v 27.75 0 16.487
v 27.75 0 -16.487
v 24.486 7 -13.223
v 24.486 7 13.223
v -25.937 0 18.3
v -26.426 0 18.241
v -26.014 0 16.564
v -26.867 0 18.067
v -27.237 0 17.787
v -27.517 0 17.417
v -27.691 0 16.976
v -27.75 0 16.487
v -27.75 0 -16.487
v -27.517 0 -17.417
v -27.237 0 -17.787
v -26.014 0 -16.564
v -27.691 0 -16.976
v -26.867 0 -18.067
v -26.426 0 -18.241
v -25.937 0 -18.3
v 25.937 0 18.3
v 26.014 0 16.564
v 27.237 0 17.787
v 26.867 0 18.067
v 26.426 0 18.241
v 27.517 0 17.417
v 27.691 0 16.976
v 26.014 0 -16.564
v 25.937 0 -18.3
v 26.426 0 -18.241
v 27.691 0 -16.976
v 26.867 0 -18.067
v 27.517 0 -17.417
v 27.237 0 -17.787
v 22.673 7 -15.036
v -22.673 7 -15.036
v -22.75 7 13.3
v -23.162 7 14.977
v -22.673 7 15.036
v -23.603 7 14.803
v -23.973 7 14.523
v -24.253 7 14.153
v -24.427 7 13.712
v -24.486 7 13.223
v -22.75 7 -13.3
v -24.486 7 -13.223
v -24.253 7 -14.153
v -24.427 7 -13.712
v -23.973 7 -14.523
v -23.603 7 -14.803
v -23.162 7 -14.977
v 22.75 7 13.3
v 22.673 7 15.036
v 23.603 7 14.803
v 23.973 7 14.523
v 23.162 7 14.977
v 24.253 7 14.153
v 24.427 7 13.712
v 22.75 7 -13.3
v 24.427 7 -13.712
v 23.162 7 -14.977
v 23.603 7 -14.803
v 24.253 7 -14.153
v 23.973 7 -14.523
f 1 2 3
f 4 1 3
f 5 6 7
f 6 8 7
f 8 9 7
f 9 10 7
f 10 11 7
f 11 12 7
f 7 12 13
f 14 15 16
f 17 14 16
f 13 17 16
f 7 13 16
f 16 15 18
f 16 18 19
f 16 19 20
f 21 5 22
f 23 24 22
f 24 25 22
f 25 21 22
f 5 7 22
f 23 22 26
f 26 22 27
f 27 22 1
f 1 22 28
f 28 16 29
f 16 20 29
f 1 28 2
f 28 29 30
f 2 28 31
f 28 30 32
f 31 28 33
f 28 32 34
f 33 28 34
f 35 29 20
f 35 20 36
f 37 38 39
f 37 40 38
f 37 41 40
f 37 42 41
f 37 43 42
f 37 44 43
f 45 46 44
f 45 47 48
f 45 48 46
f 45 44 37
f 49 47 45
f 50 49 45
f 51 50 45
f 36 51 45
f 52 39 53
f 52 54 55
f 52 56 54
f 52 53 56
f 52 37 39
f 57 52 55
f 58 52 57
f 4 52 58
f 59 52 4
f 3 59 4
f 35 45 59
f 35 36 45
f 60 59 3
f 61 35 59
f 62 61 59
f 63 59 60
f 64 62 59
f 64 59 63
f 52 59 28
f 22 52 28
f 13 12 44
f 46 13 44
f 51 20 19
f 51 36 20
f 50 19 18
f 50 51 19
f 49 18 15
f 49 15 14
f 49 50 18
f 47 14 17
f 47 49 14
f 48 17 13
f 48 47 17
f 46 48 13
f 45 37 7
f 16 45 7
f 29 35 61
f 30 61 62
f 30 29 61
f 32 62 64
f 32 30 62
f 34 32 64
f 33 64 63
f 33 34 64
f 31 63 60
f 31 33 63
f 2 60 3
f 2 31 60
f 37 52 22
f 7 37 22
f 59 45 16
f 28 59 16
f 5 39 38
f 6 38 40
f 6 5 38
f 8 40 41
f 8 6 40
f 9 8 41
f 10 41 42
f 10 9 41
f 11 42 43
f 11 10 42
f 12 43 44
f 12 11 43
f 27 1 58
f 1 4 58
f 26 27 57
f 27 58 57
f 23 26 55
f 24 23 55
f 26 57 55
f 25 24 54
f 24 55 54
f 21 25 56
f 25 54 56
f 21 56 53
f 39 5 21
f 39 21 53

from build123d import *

# Parameters (mm, degrees)
ESQUISSE2_W        = 55.5
ESQUISSE2_H        = 36.6
ESQUISSE2_W_2      = 45.5
ESQUISSE2_H_2      = 26.6
BOSS_EXTRU_1_DEPTH = 7
CONG_3_R           = 2


with BuildPart() as part:
    # Esquisse2 → Boss.-Extru.1 (new body)
    with BuildSketch(Plane(origin=(0, 0, 0), x_dir=(1, 0, 0), z_dir=(0, 1, 0))):
        Rectangle(ESQUISSE2_W, ESQUISSE2_H)
        Rectangle(ESQUISSE2_W_2, ESQUISSE2_H_2, mode=Mode.SUBTRACT)
    extrude(amount=BOSS_EXTRU_1_DEPTH)

    # Chanfrein1
    # the kernel refuses this chamfer: 7, 3.264153607 mm, written as the material it takes off along each edge
    with BuildSketch(Plane(origin=(27.75, 7, 18.3), x_dir=(0, -0.9998669641130704, 0.01631116413111024), z_dir=(-1, 0, 0)), Plane(origin=(-27.75, 7, -18.3), x_dir=(0, -0.9998669641130704, -0.01631116413111024), z_dir=(1, 0, 0))) as chanfrein1_piece_1:
        with BuildLine():
            Line((7.25473132, 0), (-0.308904716, -3.377897506))
            Line((-0.308904716, -3.377897506), (-0.448886091, -3.375613943))
            ThreePointArc((-0.448886091, -3.375613943), (-0.167567523, -1.688734801), (-0.139981375, 0.002283563))
            Line((-0.139981375, 0.002283563), (0.002283563, 0.139981375))
            ThreePointArc((0.002283563, 0.139981375), (3.628684148, 0.08082269), (7.257014883, 0.139981375))
            Line((7.257014883, 0.139981375), (7.25473132, 0))
        make_face()
    extrude(amount=55.5, mode=Mode.SUBTRACT)
    with BuildSketch(Plane(origin=(27.75, 7, -18.3), x_dir=(0.01631116413111024, -0.9998669641130704, 0), z_dir=(0, 0, 1)), Plane(origin=(-27.75, 7, 18.3), x_dir=(-0.01631116413111024, -0.9998669641130704, 0), z_dir=(0, 0, -1))) as chanfrein1_piece_2:
        with BuildLine():
            Line((7.25473132, 0), (-0.308904716, -3.377897506))
            Line((-0.308904716, -3.377897506), (-0.448886091, -3.375613943))
            ThreePointArc((-0.448886091, -3.375613943), (-0.167567523, -1.688734801), (-0.139981375, 0.002283563))
            Line((-0.139981375, 0.002283563), (0.002283563, 0.139981375))
            ThreePointArc((0.002283563, 0.139981375), (3.628684148, 0.08082269), (7.257014883, 0.139981375))
            Line((7.257014883, 0.139981375), (7.25473132, 0))
        make_face()
    extrude(amount=36.6, mode=Mode.SUBTRACT)
    with BuildSketch(Plane(origin=(22.75, 0, 13.3), x_dir=(0, 0.9998669641130704, -0.016311164131110483), z_dir=(-1, 0, 0)), Plane(origin=(-22.75, 0, -13.3), x_dir=(0, 0.9998669641130704, 0.016311164131110483), z_dir=(1, 0, 0))) as chanfrein1_piece_3:
        with BuildLine():
            Line((7.25473132, 0), (-0.308904716, -3.377897506))
            Line((-0.308904716, -3.377897506), (-0.448886091, -3.375613943))
            ThreePointArc((-0.448886091, -3.375613943), (-0.167567523, -1.688734801), (-0.139981375, 0.002283563))
            Line((-0.139981375, 0.002283563), (0.002283563, 0.139981375))
            ThreePointArc((0.002283563, 0.139981375), (3.628684148, 0.08082269), (7.257014883, 0.139981375))
            Line((7.257014883, 0.139981375), (7.25473132, 0))
        make_face()
    extrude(amount=45.5, mode=Mode.SUBTRACT)
    with BuildSketch(Plane(origin=(-22.75, 0, 13.3), x_dir=(0.01631116413111024, 0.9998669641130704, 0), z_dir=(0, 0, -1)), Plane(origin=(22.75, 0, -13.3), x_dir=(-0.01631116413111024, 0.9998669641130704, 0), z_dir=(0, 0, 1))) as chanfrein1_piece_4:
        with BuildLine():
            Line((7.25473132, 0), (-0.308904716, -3.377897506))
            Line((-0.308904716, -3.377897506), (-0.448886091, -3.375613943))
            ThreePointArc((-0.448886091, -3.375613943), (-0.167567523, -1.688734801), (-0.139981375, 0.002283563))
            Line((-0.139981375, 0.002283563), (0.002283563, 0.139981375))
            ThreePointArc((0.002283563, 0.139981375), (3.628684148, 0.08082269), (7.257014883, 0.139981375))
            Line((7.257014883, 0.139981375), (7.25473132, 0))
        make_face()
    extrude(amount=26.6, mode=Mode.SUBTRACT)
    with BuildSketch(Plane(origin=(27.75, 7, -18.3), x_dir=(0.01631116413111024, -0.9998669641130704, 0), z_dir=(0, 0, 1))) as chanfrein1_piece_5a_section:
        with BuildLine():
            Line((7.25473132, 0), (-0.308904716, -3.377897506))
            Line((-0.308904716, -3.377897506), (-0.448886091, -3.375613943))
            ThreePointArc((-0.448886091, -3.375613943), (-0.167567523, -1.688734801), (-0.139981375, 0.002283563))
            Line((-0.139981375, 0.002283563), (0.002283563, 0.139981375))
            ThreePointArc((0.002283563, 0.139981375), (3.628684148, 0.08082269), (7.257014883, 0.139981375))
            Line((7.257014883, 0.139981375), (7.25473132, 0))
        make_face()
    chanfrein1_piece_5a = extrude(amount=54.7368283, mode=Mode.PRIVATE)
    chanfrein1_piece_5a = split(chanfrein1_piece_5a, bisect_by=Plane(origin=(26.72067158, 4.632350976, 18.3), z_dir=(0, 0, 1)), keep=Keep.TOP, mode=Mode.PRIVATE)
    with BuildSketch(Plane(origin=(45.8868283, 7, 18.3), x_dir=(0, -0.9998669641130704, 0.01631116413111024), z_dir=(-1, 0, 0))) as chanfrein1_piece_5b_section:
        with BuildLine():
            Line((7.25473132, 0), (-0.308904716, -3.377897506))
            Line((-0.308904716, -3.377897506), (-0.448886091, -3.375613943))
            ThreePointArc((-0.448886091, -3.375613943), (-0.167567523, -1.688734801), (-0.139981375, 0.002283563))
            Line((-0.139981375, 0.002283563), (0.002283563, 0.139981375))
            ThreePointArc((0.002283563, 0.139981375), (3.628684148, 0.08082269), (7.257014883, 0.139981375))
            Line((7.257014883, 0.139981375), (7.25473132, 0))
        make_face()
    chanfrein1_piece_5b = extrude(amount=73.6368283, mode=Mode.PRIVATE)
    chanfrein1_piece_5b = split(chanfrein1_piece_5b, bisect_by=Plane(origin=(27.75, 4.632350976, 17.27067158), z_dir=(1, 0, 0)), keep=Keep.TOP, mode=Mode.PRIVATE)
    chanfrein1_piece_5 = chanfrein1_piece_5a & chanfrein1_piece_5b
    add(chanfrein1_piece_5, mode=Mode.SUBTRACT)
    with BuildSketch(Plane(origin=(27.75, 7, 18.3), x_dir=(0, -0.9998669641130704, 0.01631116413111024), z_dir=(-1, 0, 0))) as chanfrein1_piece_6a_section:
        with BuildLine():
            Line((7.25473132, 0), (-0.308904716, -3.377897506))
            Line((-0.308904716, -3.377897506), (-0.448886091, -3.375613943))
            ThreePointArc((-0.448886091, -3.375613943), (-0.167567523, -1.688734801), (-0.139981375, 0.002283563))
            Line((-0.139981375, 0.002283563), (0.002283563, 0.139981375))
            ThreePointArc((0.002283563, 0.139981375), (3.628684148, 0.08082269), (7.257014883, 0.139981375))
            Line((7.257014883, 0.139981375), (7.25473132, 0))
        make_face()
    chanfrein1_piece_6a = extrude(amount=73.6368283, mode=Mode.PRIVATE)
    chanfrein1_piece_6a = split(chanfrein1_piece_6a, bisect_by=Plane(origin=(-27.75, 4.632350976, 17.27067158), z_dir=(-1, 0, 0)), keep=Keep.TOP, mode=Mode.PRIVATE)
    with BuildSketch(Plane(origin=(-27.75, 7, 36.4368283), x_dir=(-0.01631116413111024, -0.9998669641130704, 0), z_dir=(0, 0, -1))) as chanfrein1_piece_6b_section:
        with BuildLine():
            Line((7.25473132, 0), (-0.308904716, -3.377897506))
            Line((-0.308904716, -3.377897506), (-0.448886091, -3.375613943))
            ThreePointArc((-0.448886091, -3.375613943), (-0.167567523, -1.688734801), (-0.139981375, 0.002283563))
            Line((-0.139981375, 0.002283563), (0.002283563, 0.139981375))
            ThreePointArc((0.002283563, 0.139981375), (3.628684148, 0.08082269), (7.257014883, 0.139981375))
            Line((7.257014883, 0.139981375), (7.25473132, 0))
        make_face()
    chanfrein1_piece_6b = extrude(amount=54.7368283, mode=Mode.PRIVATE)
    chanfrein1_piece_6b = split(chanfrein1_piece_6b, bisect_by=Plane(origin=(-26.72067158, 4.632350976, 18.3), z_dir=(0, 0, 1)), keep=Keep.TOP, mode=Mode.PRIVATE)
    chanfrein1_piece_6 = chanfrein1_piece_6a & chanfrein1_piece_6b
    add(chanfrein1_piece_6, mode=Mode.SUBTRACT)
    with BuildSketch(Plane(origin=(-27.75, 7, -18.3), x_dir=(0, -0.9998669641130704, -0.01631116413111024), z_dir=(1, 0, 0))) as chanfrein1_piece_7a_section:
        with BuildLine():
            Line((7.25473132, 0), (-0.308904716, -3.377897506))
            Line((-0.308904716, -3.377897506), (-0.448886091, -3.375613943))
            ThreePointArc((-0.448886091, -3.375613943), (-0.167567523, -1.688734801), (-0.139981375, 0.002283563))
            Line((-0.139981375, 0.002283563), (0.002283563, 0.139981375))
            ThreePointArc((0.002283563, 0.139981375), (3.628684148, 0.08082269), (7.257014883, 0.139981375))
            Line((7.257014883, 0.139981375), (7.25473132, 0))
        make_face()
    chanfrein1_piece_7a = extrude(amount=73.6368283, mode=Mode.PRIVATE)
    chanfrein1_piece_7a = split(chanfrein1_piece_7a, bisect_by=Plane(origin=(27.75, 4.632350976, -17.27067158), z_dir=(1, 0, 0)), keep=Keep.TOP, mode=Mode.PRIVATE)
    with BuildSketch(Plane(origin=(27.75, 7, -36.4368283), x_dir=(0.01631116413111024, -0.9998669641130704, 0), z_dir=(0, 0, 1))) as chanfrein1_piece_7b_section:
        with BuildLine():
            Line((7.25473132, 0), (-0.308904716, -3.377897506))
            Line((-0.308904716, -3.377897506), (-0.448886091, -3.375613943))
            ThreePointArc((-0.448886091, -3.375613943), (-0.167567523, -1.688734801), (-0.139981375, 0.002283563))
            Line((-0.139981375, 0.002283563), (0.002283563, 0.139981375))
            ThreePointArc((0.002283563, 0.139981375), (3.628684148, 0.08082269), (7.257014883, 0.139981375))
            Line((7.257014883, 0.139981375), (7.25473132, 0))
        make_face()
    chanfrein1_piece_7b = extrude(amount=54.7368283, mode=Mode.PRIVATE)
    chanfrein1_piece_7b = split(chanfrein1_piece_7b, bisect_by=Plane(origin=(26.72067158, 4.632350976, -18.3), z_dir=(0, 0, -1)), keep=Keep.TOP, mode=Mode.PRIVATE)
    chanfrein1_piece_7 = chanfrein1_piece_7a & chanfrein1_piece_7b
    add(chanfrein1_piece_7, mode=Mode.SUBTRACT)
    with BuildSketch(Plane(origin=(-45.8868283, 7, -18.3), x_dir=(0, -0.9998669641130704, -0.01631116413111024), z_dir=(1, 0, 0))) as chanfrein1_piece_8a_section:
        with BuildLine():
            Line((7.25473132, 0), (-0.308904716, -3.377897506))
            Line((-0.308904716, -3.377897506), (-0.448886091, -3.375613943))
            ThreePointArc((-0.448886091, -3.375613943), (-0.167567523, -1.688734801), (-0.139981375, 0.002283563))
            Line((-0.139981375, 0.002283563), (0.002283563, 0.139981375))
            ThreePointArc((0.002283563, 0.139981375), (3.628684148, 0.08082269), (7.257014883, 0.139981375))
            Line((7.257014883, 0.139981375), (7.25473132, 0))
        make_face()
    chanfrein1_piece_8a = extrude(amount=73.6368283, mode=Mode.PRIVATE)
    chanfrein1_piece_8a = split(chanfrein1_piece_8a, bisect_by=Plane(origin=(-27.75, 4.632350976, -17.27067158), z_dir=(-1, 0, 0)), keep=Keep.TOP, mode=Mode.PRIVATE)
    with BuildSketch(Plane(origin=(-27.75, 7, 18.3), x_dir=(-0.01631116413111024, -0.9998669641130704, 0), z_dir=(0, 0, -1))) as chanfrein1_piece_8b_section:
        with BuildLine():
            Line((7.25473132, 0), (-0.308904716, -3.377897506))
            Line((-0.308904716, -3.377897506), (-0.448886091, -3.375613943))
            ThreePointArc((-0.448886091, -3.375613943), (-0.167567523, -1.688734801), (-0.139981375, 0.002283563))
            Line((-0.139981375, 0.002283563), (0.002283563, 0.139981375))
            ThreePointArc((0.002283563, 0.139981375), (3.628684148, 0.08082269), (7.257014883, 0.139981375))
            Line((7.257014883, 0.139981375), (7.25473132, 0))
        make_face()
    chanfrein1_piece_8b = extrude(amount=54.7368283, mode=Mode.PRIVATE)
    chanfrein1_piece_8b = split(chanfrein1_piece_8b, bisect_by=Plane(origin=(-26.72067158, 4.632350976, -18.3), z_dir=(0, 0, -1)), keep=Keep.TOP, mode=Mode.PRIVATE)
    chanfrein1_piece_8 = chanfrein1_piece_8a & chanfrein1_piece_8b
    add(chanfrein1_piece_8, mode=Mode.SUBTRACT)
    with BuildSketch(Plane(origin=(40.8868283, 0, 13.3), x_dir=(0, 0.9998669641130704, -0.016311164131110483), z_dir=(-1, 0, 0))) as chanfrein1_piece_9a_section:
        with BuildLine():
            Line((7.25473132, 0), (-0.308904716, -3.377897506))
            Line((-0.308904716, -3.377897506), (-0.448886091, -3.375613943))
            ThreePointArc((-0.448886091, -3.375613943), (-0.167567523, -1.688734801), (-0.139981375, 0.002283563))
            Line((-0.139981375, 0.002283563), (0.002283563, 0.139981375))
            ThreePointArc((0.002283563, 0.139981375), (3.628684148, 0.08082269), (7.257014883, 0.139981375))
            Line((7.257014883, 0.139981375), (7.25473132, 0))
        make_face()
    chanfrein1_piece_9a = extrude(amount=63.6368283, mode=Mode.PRIVATE)
    chanfrein1_piece_9a = split(chanfrein1_piece_9a, bisect_by=Plane(origin=(22.75, 2.367649024, 14.32932842), z_dir=(1, 0, 0)), keep=Keep.TOP, mode=Mode.PRIVATE)
    with BuildSketch(Plane(origin=(22.75, 0, -13.3), x_dir=(-0.01631116413111024, 0.9998669641130704, 0), z_dir=(0, 0, 1))) as chanfrein1_piece_9b_section:
        with BuildLine():
            Line((7.25473132, 0), (-0.308904716, -3.377897506))
            Line((-0.308904716, -3.377897506), (-0.448886091, -3.375613943))
            ThreePointArc((-0.448886091, -3.375613943), (-0.167567523, -1.688734801), (-0.139981375, 0.002283563))
            Line((-0.139981375, 0.002283563), (0.002283563, 0.139981375))
            ThreePointArc((0.002283563, 0.139981375), (3.628684148, 0.08082269), (7.257014883, 0.139981375))
            Line((7.257014883, 0.139981375), (7.25473132, 0))
        make_face()
    chanfrein1_piece_9b = extrude(amount=44.7368283, mode=Mode.PRIVATE)
    chanfrein1_piece_9b = split(chanfrein1_piece_9b, bisect_by=Plane(origin=(23.77932842, 2.367649024, 13.3), z_dir=(0, 0, 1)), keep=Keep.TOP, mode=Mode.PRIVATE)
    chanfrein1_piece_9 = chanfrein1_piece_9a & chanfrein1_piece_9b
    add(chanfrein1_piece_9, mode=Mode.SUBTRACT)
    with BuildSketch(Plane(origin=(-22.75, 0, 31.4368283), x_dir=(0.01631116413111024, 0.9998669641130704, 0), z_dir=(0, 0, -1))) as chanfrein1_piece_10a_section:
        with BuildLine():
            Line((7.25473132, 0), (-0.308904716, -3.377897506))
            Line((-0.308904716, -3.377897506), (-0.448886091, -3.375613943))
            ThreePointArc((-0.448886091, -3.375613943), (-0.167567523, -1.688734801), (-0.139981375, 0.002283563))
            Line((-0.139981375, 0.002283563), (0.002283563, 0.139981375))
            ThreePointArc((0.002283563, 0.139981375), (3.628684148, 0.08082269), (7.257014883, 0.139981375))
            Line((7.257014883, 0.139981375), (7.25473132, 0))
        make_face()
    chanfrein1_piece_10a = extrude(amount=44.7368283, mode=Mode.PRIVATE)
    chanfrein1_piece_10a = split(chanfrein1_piece_10a, bisect_by=Plane(origin=(-23.77932842, 2.367649024, 13.3), z_dir=(0, 0, 1)), keep=Keep.TOP, mode=Mode.PRIVATE)
    with BuildSketch(Plane(origin=(22.75, 0, 13.3), x_dir=(0, 0.9998669641130704, -0.016311164131110483), z_dir=(-1, 0, 0))) as chanfrein1_piece_10b_section:
        with BuildLine():
            Line((7.25473132, 0), (-0.308904716, -3.377897506))
            Line((-0.308904716, -3.377897506), (-0.448886091, -3.375613943))
            ThreePointArc((-0.448886091, -3.375613943), (-0.167567523, -1.688734801), (-0.139981375, 0.002283563))
            Line((-0.139981375, 0.002283563), (0.002283563, 0.139981375))
            ThreePointArc((0.002283563, 0.139981375), (3.628684148, 0.08082269), (7.257014883, 0.139981375))
            Line((7.257014883, 0.139981375), (7.25473132, 0))
        make_face()
    chanfrein1_piece_10b = extrude(amount=63.6368283, mode=Mode.PRIVATE)
    chanfrein1_piece_10b = split(chanfrein1_piece_10b, bisect_by=Plane(origin=(-22.75, 2.367649024, 14.32932842), z_dir=(-1, 0, 0)), keep=Keep.TOP, mode=Mode.PRIVATE)
    chanfrein1_piece_10 = chanfrein1_piece_10a & chanfrein1_piece_10b
    add(chanfrein1_piece_10, mode=Mode.SUBTRACT)
    with BuildSketch(Plane(origin=(-22.75, 0, 13.3), x_dir=(0.01631116413111024, 0.9998669641130704, 0), z_dir=(0, 0, -1))) as chanfrein1_piece_11a_section:
        with BuildLine():
            Line((7.25473132, 0), (-0.308904716, -3.377897506))
            Line((-0.308904716, -3.377897506), (-0.448886091, -3.375613943))
            ThreePointArc((-0.448886091, -3.375613943), (-0.167567523, -1.688734801), (-0.139981375, 0.002283563))
            Line((-0.139981375, 0.002283563), (0.002283563, 0.139981375))
            ThreePointArc((0.002283563, 0.139981375), (3.628684148, 0.08082269), (7.257014883, 0.139981375))
            Line((7.257014883, 0.139981375), (7.25473132, 0))
        make_face()
    chanfrein1_piece_11a = extrude(amount=44.7368283, mode=Mode.PRIVATE)
    chanfrein1_piece_11a = split(chanfrein1_piece_11a, bisect_by=Plane(origin=(-23.77932842, 2.367649024, -13.3), z_dir=(0, 0, -1)), keep=Keep.TOP, mode=Mode.PRIVATE)
    with BuildSketch(Plane(origin=(-40.8868283, 0, -13.3), x_dir=(0, 0.9998669641130704, 0.016311164131110483), z_dir=(1, 0, 0))) as chanfrein1_piece_11b_section:
        with BuildLine():
            Line((7.25473132, 0), (-0.308904716, -3.377897506))
            Line((-0.308904716, -3.377897506), (-0.448886091, -3.375613943))
            ThreePointArc((-0.448886091, -3.375613943), (-0.167567523, -1.688734801), (-0.139981375, 0.002283563))
            Line((-0.139981375, 0.002283563), (0.002283563, 0.139981375))
            ThreePointArc((0.002283563, 0.139981375), (3.628684148, 0.08082269), (7.257014883, 0.139981375))
            Line((7.257014883, 0.139981375), (7.25473132, 0))
        make_face()
    chanfrein1_piece_11b = extrude(amount=63.6368283, mode=Mode.PRIVATE)
    chanfrein1_piece_11b = split(chanfrein1_piece_11b, bisect_by=Plane(origin=(-22.75, 2.367649024, -14.32932842), z_dir=(-1, 0, 0)), keep=Keep.TOP, mode=Mode.PRIVATE)
    chanfrein1_piece_11 = chanfrein1_piece_11a & chanfrein1_piece_11b
    add(chanfrein1_piece_11, mode=Mode.SUBTRACT)
    with BuildSketch(Plane(origin=(22.75, 0, -31.4368283), x_dir=(-0.01631116413111024, 0.9998669641130704, 0), z_dir=(0, 0, 1))) as chanfrein1_piece_12a_section:
        with BuildLine():
            Line((7.25473132, 0), (-0.308904716, -3.377897506))
            Line((-0.308904716, -3.377897506), (-0.448886091, -3.375613943))
            ThreePointArc((-0.448886091, -3.375613943), (-0.167567523, -1.688734801), (-0.139981375, 0.002283563))
            Line((-0.139981375, 0.002283563), (0.002283563, 0.139981375))
            ThreePointArc((0.002283563, 0.139981375), (3.628684148, 0.08082269), (7.257014883, 0.139981375))
            Line((7.257014883, 0.139981375), (7.25473132, 0))
        make_face()
    chanfrein1_piece_12a = extrude(amount=44.7368283, mode=Mode.PRIVATE)
    chanfrein1_piece_12a = split(chanfrein1_piece_12a, bisect_by=Plane(origin=(23.77932842, 2.367649024, -13.3), z_dir=(0, 0, -1)), keep=Keep.TOP, mode=Mode.PRIVATE)
    with BuildSketch(Plane(origin=(-22.75, 0, -13.3), x_dir=(0, 0.9998669641130704, 0.016311164131110483), z_dir=(1, 0, 0))) as chanfrein1_piece_12b_section:
        with BuildLine():
            Line((7.25473132, 0), (-0.308904716, -3.377897506))
            Line((-0.308904716, -3.377897506), (-0.448886091, -3.375613943))
            ThreePointArc((-0.448886091, -3.375613943), (-0.167567523, -1.688734801), (-0.139981375, 0.002283563))
            Line((-0.139981375, 0.002283563), (0.002283563, 0.139981375))
            ThreePointArc((0.002283563, 0.139981375), (3.628684148, 0.08082269), (7.257014883, 0.139981375))
            Line((7.257014883, 0.139981375), (7.25473132, 0))
        make_face()
    chanfrein1_piece_12b = extrude(amount=63.6368283, mode=Mode.PRIVATE)
    chanfrein1_piece_12b = split(chanfrein1_piece_12b, bisect_by=Plane(origin=(22.75, 2.367649024, -14.32932842), z_dir=(1, 0, 0)), keep=Keep.TOP, mode=Mode.PRIVATE)
    chanfrein1_piece_12 = chanfrein1_piece_12a & chanfrein1_piece_12b
    add(chanfrein1_piece_12, mode=Mode.SUBTRACT)

    # Congé3
    cong_3_edges = [part.edges().sort_by_distance(p)[0] for p in [
        (-26.117923196, 3.5, -16.667923196),
        (26.117923196, 3.5, -16.667923196),
        (-26.117923196, 3.5, 16.667923196),
        (26.117923196, 3.5, 16.667923196),
    ]]
    fillet(cong_3_edges, radius=CONG_3_R)


solid = part.part
